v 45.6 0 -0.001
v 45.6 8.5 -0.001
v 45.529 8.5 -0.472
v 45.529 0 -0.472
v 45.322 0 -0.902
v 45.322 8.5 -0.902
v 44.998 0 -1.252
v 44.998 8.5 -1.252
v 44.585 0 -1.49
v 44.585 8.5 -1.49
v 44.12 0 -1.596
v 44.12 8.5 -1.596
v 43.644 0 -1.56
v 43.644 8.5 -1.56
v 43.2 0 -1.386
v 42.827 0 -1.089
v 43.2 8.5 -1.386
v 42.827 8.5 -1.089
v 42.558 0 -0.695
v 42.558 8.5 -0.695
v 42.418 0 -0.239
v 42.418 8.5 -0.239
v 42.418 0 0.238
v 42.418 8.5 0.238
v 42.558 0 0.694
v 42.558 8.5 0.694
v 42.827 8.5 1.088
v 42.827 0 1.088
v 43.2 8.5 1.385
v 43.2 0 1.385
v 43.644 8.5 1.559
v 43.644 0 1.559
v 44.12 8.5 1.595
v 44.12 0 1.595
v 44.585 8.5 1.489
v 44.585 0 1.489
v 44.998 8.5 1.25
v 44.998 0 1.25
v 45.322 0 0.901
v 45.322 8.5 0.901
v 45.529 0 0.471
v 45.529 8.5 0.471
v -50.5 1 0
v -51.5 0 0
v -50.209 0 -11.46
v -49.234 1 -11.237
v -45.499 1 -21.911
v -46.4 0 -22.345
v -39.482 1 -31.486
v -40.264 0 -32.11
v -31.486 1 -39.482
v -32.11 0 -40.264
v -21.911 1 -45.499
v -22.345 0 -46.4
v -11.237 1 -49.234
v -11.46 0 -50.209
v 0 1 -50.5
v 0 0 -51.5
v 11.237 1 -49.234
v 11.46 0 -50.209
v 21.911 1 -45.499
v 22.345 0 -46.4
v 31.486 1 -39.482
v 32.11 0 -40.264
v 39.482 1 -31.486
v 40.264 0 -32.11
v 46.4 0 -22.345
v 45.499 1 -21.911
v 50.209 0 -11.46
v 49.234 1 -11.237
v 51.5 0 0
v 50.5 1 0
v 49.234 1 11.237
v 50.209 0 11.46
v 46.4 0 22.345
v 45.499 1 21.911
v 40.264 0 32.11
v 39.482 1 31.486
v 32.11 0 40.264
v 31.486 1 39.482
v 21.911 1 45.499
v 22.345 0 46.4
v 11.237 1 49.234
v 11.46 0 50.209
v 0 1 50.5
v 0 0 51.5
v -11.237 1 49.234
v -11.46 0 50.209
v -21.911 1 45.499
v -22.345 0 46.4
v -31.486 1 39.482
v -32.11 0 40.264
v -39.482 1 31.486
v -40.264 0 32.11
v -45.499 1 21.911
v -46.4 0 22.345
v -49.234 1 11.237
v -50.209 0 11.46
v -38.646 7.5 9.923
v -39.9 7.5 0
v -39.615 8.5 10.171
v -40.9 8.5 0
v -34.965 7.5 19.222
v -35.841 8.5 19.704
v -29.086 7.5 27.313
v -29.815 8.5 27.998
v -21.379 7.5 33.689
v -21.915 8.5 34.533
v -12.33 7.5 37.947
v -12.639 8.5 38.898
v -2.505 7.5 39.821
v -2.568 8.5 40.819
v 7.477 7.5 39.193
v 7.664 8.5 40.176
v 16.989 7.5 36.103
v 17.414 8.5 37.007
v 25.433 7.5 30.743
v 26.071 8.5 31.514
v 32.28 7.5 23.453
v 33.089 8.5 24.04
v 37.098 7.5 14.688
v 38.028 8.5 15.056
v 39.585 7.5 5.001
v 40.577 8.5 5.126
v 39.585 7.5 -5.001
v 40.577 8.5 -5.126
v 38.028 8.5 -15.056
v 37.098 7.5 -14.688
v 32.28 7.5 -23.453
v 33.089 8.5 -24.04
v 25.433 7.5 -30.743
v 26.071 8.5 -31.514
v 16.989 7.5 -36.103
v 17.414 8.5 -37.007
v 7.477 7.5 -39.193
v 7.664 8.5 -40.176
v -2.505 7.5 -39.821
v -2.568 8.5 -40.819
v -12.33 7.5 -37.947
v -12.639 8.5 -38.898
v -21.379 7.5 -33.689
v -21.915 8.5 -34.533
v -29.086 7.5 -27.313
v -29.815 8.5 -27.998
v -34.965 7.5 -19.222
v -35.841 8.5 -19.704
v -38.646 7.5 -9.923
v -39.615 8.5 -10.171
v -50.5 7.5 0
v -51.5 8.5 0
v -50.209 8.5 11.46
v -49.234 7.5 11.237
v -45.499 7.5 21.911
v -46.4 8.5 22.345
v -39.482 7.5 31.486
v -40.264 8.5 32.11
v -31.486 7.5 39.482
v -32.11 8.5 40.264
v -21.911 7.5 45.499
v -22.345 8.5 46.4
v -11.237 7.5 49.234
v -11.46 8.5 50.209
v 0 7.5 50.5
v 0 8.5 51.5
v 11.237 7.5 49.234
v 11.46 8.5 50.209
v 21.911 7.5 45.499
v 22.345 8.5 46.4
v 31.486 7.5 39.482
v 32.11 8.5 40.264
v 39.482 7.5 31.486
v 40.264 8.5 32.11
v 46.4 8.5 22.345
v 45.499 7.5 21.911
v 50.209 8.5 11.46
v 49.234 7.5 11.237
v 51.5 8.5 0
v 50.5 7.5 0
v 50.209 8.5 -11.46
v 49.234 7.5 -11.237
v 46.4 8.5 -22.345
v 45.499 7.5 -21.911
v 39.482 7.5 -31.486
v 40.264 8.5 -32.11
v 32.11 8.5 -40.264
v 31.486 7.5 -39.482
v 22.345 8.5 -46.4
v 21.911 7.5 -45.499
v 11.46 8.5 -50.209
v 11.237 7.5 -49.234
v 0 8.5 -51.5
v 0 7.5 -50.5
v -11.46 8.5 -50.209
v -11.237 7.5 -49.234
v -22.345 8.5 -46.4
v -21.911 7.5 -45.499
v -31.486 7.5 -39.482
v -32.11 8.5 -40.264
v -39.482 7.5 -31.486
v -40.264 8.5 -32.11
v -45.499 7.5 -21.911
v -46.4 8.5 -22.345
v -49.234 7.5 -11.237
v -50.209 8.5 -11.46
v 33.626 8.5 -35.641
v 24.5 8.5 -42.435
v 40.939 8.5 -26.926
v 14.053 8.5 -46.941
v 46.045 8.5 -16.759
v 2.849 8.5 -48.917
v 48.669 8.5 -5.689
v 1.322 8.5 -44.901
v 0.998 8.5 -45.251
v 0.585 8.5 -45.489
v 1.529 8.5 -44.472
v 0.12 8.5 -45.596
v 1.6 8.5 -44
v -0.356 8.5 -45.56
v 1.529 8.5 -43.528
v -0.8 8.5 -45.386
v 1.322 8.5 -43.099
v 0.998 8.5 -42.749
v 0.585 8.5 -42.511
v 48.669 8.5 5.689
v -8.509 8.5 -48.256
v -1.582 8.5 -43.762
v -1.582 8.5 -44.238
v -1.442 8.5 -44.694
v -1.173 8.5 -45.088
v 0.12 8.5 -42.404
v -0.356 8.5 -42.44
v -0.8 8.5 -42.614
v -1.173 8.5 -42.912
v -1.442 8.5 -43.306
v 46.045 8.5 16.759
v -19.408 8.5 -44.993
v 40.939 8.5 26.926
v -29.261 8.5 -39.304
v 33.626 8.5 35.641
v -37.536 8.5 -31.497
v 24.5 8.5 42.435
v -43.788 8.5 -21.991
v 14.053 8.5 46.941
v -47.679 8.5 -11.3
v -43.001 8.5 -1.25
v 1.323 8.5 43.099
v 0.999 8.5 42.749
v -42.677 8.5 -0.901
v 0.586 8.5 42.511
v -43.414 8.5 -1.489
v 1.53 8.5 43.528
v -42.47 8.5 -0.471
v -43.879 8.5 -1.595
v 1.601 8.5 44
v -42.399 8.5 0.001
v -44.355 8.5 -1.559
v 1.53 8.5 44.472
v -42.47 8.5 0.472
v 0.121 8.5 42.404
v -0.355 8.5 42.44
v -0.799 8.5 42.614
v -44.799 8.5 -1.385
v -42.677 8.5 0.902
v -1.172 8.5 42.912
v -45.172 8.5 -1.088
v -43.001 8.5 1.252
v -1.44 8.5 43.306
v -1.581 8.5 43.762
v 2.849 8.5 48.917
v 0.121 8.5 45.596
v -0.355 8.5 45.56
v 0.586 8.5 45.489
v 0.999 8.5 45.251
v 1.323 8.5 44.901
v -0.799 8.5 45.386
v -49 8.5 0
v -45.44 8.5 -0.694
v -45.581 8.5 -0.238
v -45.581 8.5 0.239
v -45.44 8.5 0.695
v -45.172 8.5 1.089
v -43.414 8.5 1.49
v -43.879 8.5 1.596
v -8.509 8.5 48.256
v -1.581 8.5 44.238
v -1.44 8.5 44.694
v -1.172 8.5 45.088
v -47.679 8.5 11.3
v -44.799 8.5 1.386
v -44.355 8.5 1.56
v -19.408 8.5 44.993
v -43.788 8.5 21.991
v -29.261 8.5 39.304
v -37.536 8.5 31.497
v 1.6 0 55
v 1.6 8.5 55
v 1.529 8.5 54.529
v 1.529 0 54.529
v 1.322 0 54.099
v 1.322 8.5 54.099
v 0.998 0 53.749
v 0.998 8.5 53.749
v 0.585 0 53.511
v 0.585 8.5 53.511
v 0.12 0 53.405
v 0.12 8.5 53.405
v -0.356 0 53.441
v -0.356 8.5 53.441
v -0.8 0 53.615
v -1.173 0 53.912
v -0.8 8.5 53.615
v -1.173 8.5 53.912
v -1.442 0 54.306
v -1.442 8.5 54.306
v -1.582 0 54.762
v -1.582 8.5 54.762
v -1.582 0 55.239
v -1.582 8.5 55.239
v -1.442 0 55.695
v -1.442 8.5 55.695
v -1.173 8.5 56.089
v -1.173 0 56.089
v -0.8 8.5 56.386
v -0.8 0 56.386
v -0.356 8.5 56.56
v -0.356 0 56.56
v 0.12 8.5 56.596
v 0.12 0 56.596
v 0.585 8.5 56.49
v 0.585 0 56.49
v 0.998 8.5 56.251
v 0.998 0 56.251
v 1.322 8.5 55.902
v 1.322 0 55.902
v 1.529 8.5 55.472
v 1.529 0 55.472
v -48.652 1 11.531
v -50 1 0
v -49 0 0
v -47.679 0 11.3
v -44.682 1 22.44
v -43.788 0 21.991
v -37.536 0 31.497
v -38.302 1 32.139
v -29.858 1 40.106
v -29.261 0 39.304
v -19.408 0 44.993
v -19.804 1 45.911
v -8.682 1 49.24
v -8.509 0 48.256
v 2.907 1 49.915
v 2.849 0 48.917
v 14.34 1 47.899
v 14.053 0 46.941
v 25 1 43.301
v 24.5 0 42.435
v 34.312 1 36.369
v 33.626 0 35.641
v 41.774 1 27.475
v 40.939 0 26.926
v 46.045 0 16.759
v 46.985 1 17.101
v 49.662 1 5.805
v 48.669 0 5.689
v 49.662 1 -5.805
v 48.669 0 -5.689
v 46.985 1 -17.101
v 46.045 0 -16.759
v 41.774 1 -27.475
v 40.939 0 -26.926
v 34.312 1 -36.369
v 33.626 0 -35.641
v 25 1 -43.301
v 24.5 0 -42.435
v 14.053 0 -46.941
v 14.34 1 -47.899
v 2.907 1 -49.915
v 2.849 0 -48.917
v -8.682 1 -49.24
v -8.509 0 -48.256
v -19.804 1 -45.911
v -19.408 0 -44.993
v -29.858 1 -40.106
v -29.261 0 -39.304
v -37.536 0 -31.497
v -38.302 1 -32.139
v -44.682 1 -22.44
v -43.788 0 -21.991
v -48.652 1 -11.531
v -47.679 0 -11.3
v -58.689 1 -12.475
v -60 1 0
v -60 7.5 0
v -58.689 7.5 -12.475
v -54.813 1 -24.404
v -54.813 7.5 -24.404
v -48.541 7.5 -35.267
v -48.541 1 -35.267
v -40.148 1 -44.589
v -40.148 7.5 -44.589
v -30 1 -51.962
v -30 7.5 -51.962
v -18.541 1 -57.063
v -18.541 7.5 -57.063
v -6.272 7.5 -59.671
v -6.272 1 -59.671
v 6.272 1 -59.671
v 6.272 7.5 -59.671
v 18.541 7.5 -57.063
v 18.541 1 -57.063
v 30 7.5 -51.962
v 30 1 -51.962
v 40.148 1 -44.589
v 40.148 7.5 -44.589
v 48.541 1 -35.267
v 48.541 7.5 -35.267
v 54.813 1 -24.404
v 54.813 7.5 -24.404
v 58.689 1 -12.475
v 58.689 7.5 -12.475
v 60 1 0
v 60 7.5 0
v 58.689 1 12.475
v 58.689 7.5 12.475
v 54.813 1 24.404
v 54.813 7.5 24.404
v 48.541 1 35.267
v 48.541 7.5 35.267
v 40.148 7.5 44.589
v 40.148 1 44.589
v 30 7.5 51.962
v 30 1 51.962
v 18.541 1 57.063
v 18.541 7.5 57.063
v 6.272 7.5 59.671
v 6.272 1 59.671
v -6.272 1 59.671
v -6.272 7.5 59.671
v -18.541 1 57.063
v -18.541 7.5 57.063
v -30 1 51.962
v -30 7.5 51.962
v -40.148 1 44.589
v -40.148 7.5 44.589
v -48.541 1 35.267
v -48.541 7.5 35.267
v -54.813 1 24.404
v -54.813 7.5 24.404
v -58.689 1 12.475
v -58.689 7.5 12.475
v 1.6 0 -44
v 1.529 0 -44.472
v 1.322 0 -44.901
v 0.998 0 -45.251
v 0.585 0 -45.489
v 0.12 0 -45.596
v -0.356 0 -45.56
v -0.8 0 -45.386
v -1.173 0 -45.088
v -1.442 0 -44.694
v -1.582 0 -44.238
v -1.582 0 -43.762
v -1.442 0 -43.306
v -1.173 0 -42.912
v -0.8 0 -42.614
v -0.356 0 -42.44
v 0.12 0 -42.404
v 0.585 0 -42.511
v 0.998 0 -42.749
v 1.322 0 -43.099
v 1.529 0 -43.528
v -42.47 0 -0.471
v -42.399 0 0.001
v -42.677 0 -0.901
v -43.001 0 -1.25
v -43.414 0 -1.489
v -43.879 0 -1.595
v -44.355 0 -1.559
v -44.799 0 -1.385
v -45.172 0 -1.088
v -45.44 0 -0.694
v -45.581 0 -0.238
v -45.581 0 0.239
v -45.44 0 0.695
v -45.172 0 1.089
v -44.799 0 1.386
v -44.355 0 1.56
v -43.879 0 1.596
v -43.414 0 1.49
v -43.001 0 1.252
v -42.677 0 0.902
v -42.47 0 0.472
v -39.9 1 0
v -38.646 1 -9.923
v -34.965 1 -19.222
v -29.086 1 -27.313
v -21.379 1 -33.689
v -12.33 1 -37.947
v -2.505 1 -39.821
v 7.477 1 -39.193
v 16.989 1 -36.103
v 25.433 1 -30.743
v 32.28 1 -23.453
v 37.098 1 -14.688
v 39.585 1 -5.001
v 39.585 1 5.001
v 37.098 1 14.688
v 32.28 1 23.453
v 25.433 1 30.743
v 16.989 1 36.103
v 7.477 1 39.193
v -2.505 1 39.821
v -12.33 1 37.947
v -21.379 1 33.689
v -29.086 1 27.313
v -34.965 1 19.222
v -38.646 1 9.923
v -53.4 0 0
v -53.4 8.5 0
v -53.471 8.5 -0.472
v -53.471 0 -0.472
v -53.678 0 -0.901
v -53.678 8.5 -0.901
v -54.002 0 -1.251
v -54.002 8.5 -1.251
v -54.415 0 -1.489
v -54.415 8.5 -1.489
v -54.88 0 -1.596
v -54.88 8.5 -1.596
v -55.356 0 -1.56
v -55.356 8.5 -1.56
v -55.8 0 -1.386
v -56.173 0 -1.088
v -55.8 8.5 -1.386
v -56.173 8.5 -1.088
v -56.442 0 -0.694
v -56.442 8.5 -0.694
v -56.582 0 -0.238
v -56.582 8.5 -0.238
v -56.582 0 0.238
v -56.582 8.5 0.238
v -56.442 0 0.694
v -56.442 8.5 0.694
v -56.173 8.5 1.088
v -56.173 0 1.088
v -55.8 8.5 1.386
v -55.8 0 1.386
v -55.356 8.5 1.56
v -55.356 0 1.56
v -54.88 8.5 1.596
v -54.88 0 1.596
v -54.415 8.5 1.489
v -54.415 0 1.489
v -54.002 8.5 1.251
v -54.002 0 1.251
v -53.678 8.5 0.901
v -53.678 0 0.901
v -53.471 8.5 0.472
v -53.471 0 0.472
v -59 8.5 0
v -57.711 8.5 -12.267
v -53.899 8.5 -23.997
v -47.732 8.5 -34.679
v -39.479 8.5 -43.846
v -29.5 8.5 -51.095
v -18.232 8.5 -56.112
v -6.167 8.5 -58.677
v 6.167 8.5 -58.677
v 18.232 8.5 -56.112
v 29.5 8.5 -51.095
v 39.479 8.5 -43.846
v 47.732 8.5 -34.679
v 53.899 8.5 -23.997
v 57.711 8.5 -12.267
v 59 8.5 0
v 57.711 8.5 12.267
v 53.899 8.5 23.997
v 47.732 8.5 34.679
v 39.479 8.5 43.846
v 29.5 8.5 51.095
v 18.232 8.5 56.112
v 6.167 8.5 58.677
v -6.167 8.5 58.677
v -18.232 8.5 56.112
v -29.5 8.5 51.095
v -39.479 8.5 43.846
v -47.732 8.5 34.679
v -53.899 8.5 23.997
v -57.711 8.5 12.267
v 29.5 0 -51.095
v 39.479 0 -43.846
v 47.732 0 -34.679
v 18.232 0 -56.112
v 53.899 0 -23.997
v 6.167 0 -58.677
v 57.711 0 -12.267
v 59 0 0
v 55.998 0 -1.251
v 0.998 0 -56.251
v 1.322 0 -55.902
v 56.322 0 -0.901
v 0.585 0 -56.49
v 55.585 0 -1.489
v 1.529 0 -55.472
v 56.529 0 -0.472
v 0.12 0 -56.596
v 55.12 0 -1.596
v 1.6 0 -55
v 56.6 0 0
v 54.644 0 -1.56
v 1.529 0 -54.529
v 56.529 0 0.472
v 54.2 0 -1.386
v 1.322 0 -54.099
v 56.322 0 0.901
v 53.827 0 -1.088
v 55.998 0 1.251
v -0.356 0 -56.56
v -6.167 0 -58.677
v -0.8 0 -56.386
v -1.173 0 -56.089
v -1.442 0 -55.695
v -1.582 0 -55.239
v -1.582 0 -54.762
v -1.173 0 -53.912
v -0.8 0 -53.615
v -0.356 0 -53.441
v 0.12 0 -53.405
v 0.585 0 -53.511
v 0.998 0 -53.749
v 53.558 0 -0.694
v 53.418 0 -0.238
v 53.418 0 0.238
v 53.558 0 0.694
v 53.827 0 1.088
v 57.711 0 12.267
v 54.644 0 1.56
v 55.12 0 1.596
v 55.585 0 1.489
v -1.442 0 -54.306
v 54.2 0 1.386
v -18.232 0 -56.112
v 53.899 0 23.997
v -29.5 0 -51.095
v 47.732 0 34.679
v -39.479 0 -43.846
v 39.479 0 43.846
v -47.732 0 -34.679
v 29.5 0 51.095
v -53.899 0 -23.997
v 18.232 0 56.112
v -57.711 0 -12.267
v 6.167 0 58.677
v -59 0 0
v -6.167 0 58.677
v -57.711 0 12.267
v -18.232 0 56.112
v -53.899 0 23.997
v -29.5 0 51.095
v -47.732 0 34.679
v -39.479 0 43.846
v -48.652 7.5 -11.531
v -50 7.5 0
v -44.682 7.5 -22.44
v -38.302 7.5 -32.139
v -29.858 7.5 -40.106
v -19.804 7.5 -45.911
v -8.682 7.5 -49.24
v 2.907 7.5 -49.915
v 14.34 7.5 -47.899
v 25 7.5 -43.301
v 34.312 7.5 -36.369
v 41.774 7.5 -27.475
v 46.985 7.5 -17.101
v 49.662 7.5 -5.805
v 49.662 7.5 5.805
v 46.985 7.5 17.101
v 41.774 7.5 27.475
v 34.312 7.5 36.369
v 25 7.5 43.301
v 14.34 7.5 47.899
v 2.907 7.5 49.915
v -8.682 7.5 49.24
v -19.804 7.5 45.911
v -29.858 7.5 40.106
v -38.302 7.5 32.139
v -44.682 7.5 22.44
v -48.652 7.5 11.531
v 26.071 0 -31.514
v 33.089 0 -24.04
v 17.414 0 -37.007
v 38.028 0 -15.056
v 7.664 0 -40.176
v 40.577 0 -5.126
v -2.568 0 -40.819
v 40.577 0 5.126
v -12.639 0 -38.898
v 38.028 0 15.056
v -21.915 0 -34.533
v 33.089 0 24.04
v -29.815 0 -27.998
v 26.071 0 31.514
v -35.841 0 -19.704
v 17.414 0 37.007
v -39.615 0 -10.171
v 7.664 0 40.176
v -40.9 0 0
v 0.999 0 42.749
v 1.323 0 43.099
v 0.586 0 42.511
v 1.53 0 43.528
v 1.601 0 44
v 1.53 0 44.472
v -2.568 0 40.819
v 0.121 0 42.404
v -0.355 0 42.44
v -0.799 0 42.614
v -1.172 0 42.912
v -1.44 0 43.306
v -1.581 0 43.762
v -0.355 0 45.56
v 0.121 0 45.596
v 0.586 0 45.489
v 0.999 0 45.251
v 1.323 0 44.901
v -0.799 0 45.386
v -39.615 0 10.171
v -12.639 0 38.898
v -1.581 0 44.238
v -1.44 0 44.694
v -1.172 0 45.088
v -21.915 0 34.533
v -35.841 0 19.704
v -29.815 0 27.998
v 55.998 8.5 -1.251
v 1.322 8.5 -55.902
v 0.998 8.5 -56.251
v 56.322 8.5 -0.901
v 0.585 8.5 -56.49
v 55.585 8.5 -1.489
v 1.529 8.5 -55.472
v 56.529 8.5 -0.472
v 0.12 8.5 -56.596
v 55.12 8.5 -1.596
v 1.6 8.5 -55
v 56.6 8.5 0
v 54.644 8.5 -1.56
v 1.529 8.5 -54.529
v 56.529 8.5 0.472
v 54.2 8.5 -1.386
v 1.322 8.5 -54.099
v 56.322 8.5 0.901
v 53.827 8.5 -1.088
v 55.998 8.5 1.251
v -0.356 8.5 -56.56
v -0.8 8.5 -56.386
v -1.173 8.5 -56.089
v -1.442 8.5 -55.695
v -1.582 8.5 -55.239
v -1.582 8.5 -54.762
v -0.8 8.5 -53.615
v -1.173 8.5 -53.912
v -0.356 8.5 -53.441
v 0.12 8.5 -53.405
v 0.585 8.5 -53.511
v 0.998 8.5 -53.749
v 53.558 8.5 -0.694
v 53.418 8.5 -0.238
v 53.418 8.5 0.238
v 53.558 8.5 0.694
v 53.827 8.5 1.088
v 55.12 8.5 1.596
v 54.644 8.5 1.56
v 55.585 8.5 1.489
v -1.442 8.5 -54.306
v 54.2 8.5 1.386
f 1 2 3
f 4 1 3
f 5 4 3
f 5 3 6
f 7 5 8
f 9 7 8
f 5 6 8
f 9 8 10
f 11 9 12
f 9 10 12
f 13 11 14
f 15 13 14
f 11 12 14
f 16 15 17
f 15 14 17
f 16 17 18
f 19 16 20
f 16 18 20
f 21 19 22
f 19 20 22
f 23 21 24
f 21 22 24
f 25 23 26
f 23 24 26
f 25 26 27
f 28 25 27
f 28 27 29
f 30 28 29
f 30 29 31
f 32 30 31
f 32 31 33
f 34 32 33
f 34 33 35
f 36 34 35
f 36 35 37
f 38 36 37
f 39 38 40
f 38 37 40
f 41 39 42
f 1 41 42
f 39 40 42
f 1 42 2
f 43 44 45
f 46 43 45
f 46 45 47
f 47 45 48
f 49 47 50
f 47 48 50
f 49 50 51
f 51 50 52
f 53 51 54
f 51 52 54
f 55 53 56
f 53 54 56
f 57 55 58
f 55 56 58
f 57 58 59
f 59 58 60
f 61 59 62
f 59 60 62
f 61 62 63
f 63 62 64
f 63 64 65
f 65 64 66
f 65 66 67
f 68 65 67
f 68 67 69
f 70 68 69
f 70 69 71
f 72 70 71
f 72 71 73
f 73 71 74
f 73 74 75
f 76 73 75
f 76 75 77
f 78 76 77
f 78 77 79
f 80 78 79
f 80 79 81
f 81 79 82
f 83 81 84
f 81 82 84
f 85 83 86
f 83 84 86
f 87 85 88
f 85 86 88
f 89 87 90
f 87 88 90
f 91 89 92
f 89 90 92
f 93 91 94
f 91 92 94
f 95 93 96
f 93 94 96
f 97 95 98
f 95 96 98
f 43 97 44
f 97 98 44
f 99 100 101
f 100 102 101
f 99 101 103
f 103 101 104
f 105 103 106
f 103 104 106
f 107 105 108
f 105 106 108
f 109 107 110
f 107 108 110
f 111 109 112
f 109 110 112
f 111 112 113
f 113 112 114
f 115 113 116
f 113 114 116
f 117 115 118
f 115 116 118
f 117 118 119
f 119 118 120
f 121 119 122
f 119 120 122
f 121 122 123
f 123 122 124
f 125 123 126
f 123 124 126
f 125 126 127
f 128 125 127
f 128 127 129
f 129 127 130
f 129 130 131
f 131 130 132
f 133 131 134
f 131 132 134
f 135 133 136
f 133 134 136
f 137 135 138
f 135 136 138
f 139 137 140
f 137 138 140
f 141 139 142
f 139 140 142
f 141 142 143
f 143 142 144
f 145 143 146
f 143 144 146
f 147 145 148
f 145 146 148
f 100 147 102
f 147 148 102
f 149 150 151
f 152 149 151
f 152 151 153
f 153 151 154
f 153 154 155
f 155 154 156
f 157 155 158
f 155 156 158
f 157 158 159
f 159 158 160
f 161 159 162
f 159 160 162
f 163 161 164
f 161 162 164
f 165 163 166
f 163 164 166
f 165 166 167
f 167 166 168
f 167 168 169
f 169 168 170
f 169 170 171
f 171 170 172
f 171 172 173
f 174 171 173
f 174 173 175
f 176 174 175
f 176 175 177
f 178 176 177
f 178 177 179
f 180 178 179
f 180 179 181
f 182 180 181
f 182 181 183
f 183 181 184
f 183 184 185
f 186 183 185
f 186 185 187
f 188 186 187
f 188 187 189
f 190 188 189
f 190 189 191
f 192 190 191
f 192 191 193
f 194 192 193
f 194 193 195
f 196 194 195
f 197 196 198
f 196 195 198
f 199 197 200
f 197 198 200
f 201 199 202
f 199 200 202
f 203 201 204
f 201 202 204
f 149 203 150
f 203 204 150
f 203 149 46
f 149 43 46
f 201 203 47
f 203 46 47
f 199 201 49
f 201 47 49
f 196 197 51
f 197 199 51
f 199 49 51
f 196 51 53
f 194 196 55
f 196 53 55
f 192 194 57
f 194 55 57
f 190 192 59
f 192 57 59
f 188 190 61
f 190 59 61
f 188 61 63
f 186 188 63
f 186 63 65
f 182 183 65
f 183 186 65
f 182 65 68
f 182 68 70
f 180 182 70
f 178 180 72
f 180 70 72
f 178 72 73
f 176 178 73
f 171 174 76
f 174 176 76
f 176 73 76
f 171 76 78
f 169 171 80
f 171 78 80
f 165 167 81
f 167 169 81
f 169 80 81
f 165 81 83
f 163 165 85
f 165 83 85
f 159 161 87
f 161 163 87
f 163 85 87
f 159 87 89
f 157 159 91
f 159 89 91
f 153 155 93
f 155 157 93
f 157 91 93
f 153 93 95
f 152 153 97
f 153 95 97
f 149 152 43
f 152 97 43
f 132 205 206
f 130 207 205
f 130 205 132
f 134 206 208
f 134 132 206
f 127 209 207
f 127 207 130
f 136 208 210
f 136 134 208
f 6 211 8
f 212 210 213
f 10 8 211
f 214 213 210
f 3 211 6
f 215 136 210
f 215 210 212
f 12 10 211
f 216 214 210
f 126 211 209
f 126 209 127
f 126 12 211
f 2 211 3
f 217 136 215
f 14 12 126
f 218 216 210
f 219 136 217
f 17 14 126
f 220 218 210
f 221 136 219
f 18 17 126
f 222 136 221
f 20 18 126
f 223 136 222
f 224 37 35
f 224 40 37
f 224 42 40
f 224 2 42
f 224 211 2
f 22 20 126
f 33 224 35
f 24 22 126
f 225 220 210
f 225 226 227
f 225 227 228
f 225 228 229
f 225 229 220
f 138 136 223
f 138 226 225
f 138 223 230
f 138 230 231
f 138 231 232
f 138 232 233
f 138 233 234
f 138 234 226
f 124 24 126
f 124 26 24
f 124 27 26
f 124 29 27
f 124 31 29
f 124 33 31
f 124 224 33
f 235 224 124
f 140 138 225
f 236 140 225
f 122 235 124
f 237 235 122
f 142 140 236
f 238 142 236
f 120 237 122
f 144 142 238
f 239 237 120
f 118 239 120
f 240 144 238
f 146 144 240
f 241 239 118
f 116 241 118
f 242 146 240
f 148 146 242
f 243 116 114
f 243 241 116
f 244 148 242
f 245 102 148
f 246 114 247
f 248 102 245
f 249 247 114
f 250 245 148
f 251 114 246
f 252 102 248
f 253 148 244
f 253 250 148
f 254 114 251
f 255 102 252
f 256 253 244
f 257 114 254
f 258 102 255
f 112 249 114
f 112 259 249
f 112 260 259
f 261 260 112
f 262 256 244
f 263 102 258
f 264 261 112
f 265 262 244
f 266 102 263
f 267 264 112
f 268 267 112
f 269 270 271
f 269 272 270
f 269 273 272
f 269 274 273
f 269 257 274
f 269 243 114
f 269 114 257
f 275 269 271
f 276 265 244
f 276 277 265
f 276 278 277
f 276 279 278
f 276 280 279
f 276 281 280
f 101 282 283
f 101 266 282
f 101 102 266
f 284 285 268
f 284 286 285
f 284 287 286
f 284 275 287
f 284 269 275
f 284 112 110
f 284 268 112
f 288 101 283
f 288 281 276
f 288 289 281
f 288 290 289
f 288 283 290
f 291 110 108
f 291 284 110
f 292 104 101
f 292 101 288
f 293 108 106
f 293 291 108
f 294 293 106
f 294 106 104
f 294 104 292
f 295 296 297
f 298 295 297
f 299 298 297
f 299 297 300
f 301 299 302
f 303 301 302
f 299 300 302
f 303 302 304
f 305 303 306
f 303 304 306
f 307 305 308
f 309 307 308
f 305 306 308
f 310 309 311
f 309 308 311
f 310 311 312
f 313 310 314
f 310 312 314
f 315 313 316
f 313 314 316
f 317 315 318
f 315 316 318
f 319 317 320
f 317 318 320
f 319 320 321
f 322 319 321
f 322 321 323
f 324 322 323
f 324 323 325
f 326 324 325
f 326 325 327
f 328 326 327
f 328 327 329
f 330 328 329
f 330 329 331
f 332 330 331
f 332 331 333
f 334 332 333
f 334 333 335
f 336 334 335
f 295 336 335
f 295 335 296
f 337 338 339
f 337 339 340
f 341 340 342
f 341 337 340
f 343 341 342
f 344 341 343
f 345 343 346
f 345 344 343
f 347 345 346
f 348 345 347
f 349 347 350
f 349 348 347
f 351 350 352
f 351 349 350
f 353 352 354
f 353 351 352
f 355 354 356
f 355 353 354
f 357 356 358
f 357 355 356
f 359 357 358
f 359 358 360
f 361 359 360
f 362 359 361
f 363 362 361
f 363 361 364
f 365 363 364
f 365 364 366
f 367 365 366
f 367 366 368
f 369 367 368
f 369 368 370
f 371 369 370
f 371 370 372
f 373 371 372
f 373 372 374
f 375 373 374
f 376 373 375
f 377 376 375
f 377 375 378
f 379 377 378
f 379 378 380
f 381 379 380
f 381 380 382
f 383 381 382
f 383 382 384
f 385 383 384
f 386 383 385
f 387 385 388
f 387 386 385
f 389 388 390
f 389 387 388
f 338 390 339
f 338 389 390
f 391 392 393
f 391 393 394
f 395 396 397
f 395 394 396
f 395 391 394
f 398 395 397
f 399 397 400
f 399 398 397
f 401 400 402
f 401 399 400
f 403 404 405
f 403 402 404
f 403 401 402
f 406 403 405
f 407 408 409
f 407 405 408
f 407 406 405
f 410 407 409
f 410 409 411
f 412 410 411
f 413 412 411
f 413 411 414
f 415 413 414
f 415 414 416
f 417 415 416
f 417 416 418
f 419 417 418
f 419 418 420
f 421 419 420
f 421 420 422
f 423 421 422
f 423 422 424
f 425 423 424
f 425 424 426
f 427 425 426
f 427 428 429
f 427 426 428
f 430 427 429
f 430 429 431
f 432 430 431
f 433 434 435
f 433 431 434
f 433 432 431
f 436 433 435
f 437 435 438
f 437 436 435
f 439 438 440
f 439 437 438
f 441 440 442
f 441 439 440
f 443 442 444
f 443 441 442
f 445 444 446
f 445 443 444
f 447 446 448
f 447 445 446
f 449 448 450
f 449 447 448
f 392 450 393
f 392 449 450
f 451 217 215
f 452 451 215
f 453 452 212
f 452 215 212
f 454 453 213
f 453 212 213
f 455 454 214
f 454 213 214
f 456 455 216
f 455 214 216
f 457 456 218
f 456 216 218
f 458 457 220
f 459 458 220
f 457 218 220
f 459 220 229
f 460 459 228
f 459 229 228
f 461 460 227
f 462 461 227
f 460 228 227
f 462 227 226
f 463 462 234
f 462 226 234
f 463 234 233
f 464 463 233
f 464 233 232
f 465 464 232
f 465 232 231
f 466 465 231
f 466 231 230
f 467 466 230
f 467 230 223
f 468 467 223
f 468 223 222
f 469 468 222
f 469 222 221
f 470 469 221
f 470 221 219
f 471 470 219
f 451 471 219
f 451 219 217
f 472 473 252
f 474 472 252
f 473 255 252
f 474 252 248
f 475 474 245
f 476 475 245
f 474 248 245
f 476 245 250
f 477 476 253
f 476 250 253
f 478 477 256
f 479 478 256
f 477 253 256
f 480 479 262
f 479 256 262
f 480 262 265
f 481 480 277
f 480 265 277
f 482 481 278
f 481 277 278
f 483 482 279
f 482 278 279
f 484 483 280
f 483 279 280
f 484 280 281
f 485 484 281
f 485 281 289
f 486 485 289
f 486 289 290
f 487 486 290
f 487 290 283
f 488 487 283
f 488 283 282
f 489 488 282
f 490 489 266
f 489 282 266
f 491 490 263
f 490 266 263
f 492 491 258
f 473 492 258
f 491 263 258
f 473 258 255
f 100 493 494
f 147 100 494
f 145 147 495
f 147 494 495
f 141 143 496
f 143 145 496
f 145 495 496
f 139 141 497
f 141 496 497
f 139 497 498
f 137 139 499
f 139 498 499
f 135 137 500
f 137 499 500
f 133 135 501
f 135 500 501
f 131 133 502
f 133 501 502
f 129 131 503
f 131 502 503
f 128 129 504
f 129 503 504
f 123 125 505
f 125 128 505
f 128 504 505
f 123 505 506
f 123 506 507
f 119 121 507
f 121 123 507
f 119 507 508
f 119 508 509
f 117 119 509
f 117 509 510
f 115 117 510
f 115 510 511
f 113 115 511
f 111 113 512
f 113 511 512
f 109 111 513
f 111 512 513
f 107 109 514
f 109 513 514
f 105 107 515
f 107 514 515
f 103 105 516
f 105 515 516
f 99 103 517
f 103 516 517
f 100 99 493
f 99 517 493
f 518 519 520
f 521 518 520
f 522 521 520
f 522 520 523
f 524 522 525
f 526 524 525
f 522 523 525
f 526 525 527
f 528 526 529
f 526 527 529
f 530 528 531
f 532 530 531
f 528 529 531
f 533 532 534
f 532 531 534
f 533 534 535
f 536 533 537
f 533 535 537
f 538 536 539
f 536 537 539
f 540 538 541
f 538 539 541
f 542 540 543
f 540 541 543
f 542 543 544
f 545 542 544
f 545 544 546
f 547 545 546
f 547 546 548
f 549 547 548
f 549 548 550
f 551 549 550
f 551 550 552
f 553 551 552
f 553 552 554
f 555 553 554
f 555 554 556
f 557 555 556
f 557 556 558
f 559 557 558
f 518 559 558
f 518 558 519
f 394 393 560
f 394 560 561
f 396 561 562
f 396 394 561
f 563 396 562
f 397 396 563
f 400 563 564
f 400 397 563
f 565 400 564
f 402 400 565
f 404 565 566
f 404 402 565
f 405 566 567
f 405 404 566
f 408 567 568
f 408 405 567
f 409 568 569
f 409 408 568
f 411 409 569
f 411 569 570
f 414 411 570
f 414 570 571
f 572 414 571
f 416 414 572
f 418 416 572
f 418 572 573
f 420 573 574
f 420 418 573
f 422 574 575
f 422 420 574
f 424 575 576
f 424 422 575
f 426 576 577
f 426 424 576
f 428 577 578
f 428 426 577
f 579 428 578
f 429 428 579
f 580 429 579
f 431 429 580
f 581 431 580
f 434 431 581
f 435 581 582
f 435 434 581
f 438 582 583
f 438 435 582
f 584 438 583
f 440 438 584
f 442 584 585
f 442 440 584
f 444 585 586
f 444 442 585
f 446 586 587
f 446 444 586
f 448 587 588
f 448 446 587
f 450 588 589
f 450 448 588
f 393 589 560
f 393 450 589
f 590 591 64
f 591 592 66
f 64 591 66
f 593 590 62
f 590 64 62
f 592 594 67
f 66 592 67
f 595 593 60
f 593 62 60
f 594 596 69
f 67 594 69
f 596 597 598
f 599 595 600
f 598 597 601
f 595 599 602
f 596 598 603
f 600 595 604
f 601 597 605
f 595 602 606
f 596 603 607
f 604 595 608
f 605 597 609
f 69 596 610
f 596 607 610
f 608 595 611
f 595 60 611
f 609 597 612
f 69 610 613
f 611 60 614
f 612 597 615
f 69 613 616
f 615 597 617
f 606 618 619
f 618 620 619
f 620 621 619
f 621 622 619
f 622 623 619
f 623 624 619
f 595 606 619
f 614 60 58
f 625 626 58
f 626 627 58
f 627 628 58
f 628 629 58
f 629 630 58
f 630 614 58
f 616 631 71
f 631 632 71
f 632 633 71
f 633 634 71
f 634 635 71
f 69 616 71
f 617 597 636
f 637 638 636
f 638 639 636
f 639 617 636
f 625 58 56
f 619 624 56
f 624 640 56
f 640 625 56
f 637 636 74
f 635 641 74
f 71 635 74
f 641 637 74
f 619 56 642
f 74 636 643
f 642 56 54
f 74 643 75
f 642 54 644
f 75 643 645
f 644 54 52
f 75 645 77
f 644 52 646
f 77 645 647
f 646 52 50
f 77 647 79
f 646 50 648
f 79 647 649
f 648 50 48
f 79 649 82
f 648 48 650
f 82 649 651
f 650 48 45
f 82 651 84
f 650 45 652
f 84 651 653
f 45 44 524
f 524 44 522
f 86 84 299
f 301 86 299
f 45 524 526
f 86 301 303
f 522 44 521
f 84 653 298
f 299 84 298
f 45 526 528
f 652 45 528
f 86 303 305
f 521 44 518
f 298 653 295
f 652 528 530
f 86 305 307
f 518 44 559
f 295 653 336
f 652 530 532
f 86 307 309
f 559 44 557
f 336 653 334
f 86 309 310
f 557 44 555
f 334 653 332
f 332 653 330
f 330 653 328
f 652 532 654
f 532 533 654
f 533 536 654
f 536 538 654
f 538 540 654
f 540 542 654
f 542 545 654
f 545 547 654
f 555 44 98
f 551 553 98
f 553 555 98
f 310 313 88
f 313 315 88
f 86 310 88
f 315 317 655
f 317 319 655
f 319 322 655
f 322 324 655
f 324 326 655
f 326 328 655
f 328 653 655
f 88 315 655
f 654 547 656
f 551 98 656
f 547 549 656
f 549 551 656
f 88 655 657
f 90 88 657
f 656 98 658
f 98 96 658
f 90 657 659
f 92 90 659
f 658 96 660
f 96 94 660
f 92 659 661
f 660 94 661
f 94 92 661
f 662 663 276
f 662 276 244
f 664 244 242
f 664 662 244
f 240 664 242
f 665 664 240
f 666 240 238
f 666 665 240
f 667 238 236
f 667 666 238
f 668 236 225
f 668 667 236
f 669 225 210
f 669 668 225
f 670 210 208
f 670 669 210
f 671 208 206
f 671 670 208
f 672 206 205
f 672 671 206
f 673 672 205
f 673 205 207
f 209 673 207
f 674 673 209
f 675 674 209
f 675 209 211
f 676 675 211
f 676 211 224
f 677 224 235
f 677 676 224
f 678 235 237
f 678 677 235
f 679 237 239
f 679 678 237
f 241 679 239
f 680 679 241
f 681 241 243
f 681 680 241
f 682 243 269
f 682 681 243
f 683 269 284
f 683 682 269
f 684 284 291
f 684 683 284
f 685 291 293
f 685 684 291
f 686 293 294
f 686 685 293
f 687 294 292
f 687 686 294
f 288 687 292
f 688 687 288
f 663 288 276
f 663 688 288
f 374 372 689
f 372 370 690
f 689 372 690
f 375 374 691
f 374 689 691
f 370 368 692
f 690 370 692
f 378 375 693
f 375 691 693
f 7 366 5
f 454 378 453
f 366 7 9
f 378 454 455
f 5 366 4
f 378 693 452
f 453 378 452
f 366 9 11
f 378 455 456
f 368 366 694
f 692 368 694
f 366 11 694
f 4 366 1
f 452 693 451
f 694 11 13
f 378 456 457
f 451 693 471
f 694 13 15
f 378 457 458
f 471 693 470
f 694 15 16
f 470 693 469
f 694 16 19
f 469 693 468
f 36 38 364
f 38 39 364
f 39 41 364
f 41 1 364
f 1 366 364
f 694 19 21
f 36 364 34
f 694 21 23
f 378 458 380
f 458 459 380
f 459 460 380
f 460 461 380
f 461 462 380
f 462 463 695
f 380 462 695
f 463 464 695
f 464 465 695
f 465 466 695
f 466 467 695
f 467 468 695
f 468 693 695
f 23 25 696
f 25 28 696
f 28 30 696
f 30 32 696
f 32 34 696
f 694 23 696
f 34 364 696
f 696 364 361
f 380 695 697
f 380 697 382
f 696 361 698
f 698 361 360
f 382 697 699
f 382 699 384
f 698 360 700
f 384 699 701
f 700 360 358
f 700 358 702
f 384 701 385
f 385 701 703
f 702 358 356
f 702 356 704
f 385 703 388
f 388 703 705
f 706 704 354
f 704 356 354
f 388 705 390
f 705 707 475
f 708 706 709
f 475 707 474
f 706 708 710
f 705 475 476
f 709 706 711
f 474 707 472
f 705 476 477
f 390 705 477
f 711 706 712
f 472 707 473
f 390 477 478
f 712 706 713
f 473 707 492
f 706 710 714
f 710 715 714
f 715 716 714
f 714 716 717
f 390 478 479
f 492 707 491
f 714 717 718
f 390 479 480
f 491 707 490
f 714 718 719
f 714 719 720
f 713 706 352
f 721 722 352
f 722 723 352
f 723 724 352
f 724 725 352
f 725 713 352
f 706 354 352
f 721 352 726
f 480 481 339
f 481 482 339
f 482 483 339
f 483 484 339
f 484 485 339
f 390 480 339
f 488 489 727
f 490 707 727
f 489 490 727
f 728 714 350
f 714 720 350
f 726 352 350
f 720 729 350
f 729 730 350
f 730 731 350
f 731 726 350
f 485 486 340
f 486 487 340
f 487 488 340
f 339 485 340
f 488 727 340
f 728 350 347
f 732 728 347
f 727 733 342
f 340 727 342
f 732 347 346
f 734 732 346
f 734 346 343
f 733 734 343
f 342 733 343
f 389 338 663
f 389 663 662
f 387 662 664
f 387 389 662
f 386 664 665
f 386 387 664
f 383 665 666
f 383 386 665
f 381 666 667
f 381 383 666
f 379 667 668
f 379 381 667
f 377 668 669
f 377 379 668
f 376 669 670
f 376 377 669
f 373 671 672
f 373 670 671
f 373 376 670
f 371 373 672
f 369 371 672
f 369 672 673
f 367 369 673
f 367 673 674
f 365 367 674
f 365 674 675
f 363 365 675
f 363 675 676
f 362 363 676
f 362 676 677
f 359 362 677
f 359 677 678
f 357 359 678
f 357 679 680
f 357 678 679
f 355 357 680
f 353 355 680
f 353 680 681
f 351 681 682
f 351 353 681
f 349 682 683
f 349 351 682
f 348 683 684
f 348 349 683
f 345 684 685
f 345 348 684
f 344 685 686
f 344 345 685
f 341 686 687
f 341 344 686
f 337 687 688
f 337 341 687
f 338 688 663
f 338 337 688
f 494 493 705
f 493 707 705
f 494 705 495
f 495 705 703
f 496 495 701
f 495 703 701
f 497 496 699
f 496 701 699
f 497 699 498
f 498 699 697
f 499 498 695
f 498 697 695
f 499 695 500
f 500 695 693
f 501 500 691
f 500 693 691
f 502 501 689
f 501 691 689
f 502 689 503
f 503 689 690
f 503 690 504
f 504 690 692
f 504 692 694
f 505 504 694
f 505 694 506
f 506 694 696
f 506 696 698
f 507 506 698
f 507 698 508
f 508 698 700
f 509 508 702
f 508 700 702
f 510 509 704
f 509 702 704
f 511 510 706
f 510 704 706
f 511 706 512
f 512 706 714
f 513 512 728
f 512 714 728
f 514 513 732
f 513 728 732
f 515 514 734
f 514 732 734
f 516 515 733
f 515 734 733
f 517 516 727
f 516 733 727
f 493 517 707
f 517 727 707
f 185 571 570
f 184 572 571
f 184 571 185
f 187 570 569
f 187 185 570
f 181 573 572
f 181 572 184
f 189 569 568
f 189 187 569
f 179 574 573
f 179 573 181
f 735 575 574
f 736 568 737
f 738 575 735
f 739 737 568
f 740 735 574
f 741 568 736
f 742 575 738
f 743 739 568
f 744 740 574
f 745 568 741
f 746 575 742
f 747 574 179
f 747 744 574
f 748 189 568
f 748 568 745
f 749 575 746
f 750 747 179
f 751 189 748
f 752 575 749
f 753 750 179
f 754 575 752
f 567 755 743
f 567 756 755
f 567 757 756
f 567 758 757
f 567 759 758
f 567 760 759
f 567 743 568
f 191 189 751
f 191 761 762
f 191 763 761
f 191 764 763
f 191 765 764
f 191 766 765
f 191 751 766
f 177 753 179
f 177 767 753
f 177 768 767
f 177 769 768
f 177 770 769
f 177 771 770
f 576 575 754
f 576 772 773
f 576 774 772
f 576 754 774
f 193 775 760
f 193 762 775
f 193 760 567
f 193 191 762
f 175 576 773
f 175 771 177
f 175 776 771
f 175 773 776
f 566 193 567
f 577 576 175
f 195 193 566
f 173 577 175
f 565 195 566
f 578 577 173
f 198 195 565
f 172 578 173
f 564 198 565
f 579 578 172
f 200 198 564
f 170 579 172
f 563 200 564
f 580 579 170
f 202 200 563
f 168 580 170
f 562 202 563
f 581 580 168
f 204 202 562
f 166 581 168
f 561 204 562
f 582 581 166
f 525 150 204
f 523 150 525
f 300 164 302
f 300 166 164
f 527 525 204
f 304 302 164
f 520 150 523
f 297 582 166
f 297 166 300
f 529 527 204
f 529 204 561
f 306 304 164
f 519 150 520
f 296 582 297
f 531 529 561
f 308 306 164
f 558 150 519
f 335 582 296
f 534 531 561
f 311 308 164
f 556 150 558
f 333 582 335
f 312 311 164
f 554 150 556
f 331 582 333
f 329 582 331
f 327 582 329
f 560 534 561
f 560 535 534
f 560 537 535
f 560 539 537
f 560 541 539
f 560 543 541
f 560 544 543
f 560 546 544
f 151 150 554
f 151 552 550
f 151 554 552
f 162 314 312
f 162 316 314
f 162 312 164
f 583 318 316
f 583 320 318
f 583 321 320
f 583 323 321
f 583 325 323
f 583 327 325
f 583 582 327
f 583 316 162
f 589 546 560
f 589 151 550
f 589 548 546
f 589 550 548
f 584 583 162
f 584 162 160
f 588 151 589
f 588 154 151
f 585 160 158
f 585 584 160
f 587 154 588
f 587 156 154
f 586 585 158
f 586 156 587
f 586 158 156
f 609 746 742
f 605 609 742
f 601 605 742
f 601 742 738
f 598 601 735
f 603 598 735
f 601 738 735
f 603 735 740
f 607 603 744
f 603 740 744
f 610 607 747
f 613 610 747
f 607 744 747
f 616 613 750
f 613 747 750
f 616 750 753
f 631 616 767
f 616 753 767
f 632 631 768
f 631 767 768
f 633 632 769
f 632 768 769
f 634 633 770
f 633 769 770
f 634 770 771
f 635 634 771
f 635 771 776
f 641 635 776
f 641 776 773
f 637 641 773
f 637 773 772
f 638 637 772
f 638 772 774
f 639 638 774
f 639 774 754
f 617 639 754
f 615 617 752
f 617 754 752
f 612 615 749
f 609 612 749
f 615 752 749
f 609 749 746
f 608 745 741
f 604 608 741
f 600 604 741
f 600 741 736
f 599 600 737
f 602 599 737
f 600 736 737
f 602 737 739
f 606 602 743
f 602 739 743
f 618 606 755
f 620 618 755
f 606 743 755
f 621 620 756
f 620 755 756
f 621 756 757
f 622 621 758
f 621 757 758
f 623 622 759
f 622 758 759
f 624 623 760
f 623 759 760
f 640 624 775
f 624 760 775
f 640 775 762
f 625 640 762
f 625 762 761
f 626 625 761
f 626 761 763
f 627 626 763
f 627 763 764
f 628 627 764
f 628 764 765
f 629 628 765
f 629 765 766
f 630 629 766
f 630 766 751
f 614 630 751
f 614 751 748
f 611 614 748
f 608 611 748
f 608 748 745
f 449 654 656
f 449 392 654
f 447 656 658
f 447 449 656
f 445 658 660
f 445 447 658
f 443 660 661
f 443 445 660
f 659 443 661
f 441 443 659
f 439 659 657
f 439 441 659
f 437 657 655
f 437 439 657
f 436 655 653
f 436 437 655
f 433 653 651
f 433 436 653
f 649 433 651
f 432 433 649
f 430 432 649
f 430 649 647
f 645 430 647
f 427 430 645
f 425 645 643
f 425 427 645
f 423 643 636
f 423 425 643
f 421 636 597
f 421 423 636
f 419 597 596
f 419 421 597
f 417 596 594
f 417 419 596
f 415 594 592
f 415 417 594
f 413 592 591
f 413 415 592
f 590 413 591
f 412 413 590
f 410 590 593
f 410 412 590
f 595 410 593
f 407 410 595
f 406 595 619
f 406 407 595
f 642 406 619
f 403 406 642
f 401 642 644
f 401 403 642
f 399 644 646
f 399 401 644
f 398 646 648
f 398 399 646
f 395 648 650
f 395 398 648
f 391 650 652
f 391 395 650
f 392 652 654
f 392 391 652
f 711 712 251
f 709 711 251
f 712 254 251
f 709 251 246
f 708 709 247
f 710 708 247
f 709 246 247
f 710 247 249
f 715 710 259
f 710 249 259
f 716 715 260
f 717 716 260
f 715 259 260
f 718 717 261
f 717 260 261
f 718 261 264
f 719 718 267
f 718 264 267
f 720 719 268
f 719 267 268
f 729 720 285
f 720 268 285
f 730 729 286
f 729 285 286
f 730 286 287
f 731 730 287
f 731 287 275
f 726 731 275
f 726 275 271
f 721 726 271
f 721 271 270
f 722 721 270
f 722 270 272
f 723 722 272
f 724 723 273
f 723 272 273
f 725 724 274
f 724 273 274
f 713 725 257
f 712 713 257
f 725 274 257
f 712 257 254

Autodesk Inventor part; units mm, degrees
ref_plane "YZ Plane" through (0, 0, 0) normal (1, 0, 0) x (0, 1, 0)
ref_plane "XZ Plane" through (0, 0, 0) normal (0, 1, 0) x (-1, 0, 0)
ref_plane "XY Plane" through (0, 0, 0) normal (0, 0, 1) x (1, 0, 0)
sketch "Sketch1" plane through (0, 0, 0) normal (0, 1, 0) x (-1, 0, 0)
  circle A0 centre (0, 0) radius 39.9
  circle A1 centre (0, 0) radius 50
  circle A2 centre (0, 0) radius 60
  circle A3 centre (0, 0) radius 50.5
  dimension "d0" = 79.8
  dimension "d1" = 100
  dimension "d2" = 120
  dimension "d3" = 101
extrude "Extrusion1" add sketch "Sketch1" along normal blind 8.5
chamfer "Chamfer1" distance 1 angle 45 4 edges at (60, 8.5, 0) (60, 0, 0) (39.9, 8.5, 0) (39.9, 0, 0)
chamfer "Chamfer2" distance 1 angle 45 4 edges at (50.5, 8.5, 0) (50, 8.5, 0) (50.5, 0, 0) (50, 0, 0)
sketch "Sketch2" plane through (0, 8.5, 0) normal (0, 1, 0) x (1, 0, 0)
  circle A0 centre (0, 55.0004) radius 1.6
  circle A1 centre (-55, 0) radius 1.6
  circle A2 centre (0, -55.0004) radius 1.6
  circle A3 centre (55, 0) radius 1.6
  circle A4 centre (0, 0) radius 59 projected
  circle A5 centre (0, 0) radius 51.5 projected
  dimension "d12" = 3.2
  dimension "d13" = 3.2
  dimension "d14" = 3.2
  dimension "d15" = 3.2
  dimension "d16" = 77.782
  dimension "d17" = 77.782
  dimension "d18" = 77.782
  dimension "d19" = 77.782
  dimension "d20" = 0
  dimension "d21" = 0
  dimension "d22" = 0
  dimension "d25" = 55
extrude "Extrusion2" cut sketch "Sketch2" against normal up to surface (8.5 mm away) contours A0 | A1 | A2 | A3
sketch "Sketch3" plane through (0, 8.5, 0) normal (0, 1, 0) x (1, 0, 0)
  circle A0 centre (44, 0.0006) radius 1.6
  circle A1 centre (0, 44) radius 1.6
  circle A2 centre (-43.9989, -0.0006) radius 1.6
  circle A3 centre (0.0011, -44) radius 1.6
  circle A4 centre (0, 55.0004) radius 1.6 projected
  line L0 (0, 0) -> (0, 55.0004)
  dimension "d26" = 3.2
  dimension "d27" = 3.2
  dimension "d28" = 3.2
  dimension "d29" = 3.2
  dimension "d30" = 62.225
  dimension "d31" = 62.225
  dimension "d32" = 62.225
  dimension "d33" = 62.225
  dimension "d34" = 44
  dimension "d35" = 44
  dimension "d36" = 44
extrude "Extrusion3" cut sketch "Sketch3" against normal up to surface (8.5 mm away) contours A0 | A1 L0 | L0 A1 | A2 | A3
properties part number "lazy_susan"
